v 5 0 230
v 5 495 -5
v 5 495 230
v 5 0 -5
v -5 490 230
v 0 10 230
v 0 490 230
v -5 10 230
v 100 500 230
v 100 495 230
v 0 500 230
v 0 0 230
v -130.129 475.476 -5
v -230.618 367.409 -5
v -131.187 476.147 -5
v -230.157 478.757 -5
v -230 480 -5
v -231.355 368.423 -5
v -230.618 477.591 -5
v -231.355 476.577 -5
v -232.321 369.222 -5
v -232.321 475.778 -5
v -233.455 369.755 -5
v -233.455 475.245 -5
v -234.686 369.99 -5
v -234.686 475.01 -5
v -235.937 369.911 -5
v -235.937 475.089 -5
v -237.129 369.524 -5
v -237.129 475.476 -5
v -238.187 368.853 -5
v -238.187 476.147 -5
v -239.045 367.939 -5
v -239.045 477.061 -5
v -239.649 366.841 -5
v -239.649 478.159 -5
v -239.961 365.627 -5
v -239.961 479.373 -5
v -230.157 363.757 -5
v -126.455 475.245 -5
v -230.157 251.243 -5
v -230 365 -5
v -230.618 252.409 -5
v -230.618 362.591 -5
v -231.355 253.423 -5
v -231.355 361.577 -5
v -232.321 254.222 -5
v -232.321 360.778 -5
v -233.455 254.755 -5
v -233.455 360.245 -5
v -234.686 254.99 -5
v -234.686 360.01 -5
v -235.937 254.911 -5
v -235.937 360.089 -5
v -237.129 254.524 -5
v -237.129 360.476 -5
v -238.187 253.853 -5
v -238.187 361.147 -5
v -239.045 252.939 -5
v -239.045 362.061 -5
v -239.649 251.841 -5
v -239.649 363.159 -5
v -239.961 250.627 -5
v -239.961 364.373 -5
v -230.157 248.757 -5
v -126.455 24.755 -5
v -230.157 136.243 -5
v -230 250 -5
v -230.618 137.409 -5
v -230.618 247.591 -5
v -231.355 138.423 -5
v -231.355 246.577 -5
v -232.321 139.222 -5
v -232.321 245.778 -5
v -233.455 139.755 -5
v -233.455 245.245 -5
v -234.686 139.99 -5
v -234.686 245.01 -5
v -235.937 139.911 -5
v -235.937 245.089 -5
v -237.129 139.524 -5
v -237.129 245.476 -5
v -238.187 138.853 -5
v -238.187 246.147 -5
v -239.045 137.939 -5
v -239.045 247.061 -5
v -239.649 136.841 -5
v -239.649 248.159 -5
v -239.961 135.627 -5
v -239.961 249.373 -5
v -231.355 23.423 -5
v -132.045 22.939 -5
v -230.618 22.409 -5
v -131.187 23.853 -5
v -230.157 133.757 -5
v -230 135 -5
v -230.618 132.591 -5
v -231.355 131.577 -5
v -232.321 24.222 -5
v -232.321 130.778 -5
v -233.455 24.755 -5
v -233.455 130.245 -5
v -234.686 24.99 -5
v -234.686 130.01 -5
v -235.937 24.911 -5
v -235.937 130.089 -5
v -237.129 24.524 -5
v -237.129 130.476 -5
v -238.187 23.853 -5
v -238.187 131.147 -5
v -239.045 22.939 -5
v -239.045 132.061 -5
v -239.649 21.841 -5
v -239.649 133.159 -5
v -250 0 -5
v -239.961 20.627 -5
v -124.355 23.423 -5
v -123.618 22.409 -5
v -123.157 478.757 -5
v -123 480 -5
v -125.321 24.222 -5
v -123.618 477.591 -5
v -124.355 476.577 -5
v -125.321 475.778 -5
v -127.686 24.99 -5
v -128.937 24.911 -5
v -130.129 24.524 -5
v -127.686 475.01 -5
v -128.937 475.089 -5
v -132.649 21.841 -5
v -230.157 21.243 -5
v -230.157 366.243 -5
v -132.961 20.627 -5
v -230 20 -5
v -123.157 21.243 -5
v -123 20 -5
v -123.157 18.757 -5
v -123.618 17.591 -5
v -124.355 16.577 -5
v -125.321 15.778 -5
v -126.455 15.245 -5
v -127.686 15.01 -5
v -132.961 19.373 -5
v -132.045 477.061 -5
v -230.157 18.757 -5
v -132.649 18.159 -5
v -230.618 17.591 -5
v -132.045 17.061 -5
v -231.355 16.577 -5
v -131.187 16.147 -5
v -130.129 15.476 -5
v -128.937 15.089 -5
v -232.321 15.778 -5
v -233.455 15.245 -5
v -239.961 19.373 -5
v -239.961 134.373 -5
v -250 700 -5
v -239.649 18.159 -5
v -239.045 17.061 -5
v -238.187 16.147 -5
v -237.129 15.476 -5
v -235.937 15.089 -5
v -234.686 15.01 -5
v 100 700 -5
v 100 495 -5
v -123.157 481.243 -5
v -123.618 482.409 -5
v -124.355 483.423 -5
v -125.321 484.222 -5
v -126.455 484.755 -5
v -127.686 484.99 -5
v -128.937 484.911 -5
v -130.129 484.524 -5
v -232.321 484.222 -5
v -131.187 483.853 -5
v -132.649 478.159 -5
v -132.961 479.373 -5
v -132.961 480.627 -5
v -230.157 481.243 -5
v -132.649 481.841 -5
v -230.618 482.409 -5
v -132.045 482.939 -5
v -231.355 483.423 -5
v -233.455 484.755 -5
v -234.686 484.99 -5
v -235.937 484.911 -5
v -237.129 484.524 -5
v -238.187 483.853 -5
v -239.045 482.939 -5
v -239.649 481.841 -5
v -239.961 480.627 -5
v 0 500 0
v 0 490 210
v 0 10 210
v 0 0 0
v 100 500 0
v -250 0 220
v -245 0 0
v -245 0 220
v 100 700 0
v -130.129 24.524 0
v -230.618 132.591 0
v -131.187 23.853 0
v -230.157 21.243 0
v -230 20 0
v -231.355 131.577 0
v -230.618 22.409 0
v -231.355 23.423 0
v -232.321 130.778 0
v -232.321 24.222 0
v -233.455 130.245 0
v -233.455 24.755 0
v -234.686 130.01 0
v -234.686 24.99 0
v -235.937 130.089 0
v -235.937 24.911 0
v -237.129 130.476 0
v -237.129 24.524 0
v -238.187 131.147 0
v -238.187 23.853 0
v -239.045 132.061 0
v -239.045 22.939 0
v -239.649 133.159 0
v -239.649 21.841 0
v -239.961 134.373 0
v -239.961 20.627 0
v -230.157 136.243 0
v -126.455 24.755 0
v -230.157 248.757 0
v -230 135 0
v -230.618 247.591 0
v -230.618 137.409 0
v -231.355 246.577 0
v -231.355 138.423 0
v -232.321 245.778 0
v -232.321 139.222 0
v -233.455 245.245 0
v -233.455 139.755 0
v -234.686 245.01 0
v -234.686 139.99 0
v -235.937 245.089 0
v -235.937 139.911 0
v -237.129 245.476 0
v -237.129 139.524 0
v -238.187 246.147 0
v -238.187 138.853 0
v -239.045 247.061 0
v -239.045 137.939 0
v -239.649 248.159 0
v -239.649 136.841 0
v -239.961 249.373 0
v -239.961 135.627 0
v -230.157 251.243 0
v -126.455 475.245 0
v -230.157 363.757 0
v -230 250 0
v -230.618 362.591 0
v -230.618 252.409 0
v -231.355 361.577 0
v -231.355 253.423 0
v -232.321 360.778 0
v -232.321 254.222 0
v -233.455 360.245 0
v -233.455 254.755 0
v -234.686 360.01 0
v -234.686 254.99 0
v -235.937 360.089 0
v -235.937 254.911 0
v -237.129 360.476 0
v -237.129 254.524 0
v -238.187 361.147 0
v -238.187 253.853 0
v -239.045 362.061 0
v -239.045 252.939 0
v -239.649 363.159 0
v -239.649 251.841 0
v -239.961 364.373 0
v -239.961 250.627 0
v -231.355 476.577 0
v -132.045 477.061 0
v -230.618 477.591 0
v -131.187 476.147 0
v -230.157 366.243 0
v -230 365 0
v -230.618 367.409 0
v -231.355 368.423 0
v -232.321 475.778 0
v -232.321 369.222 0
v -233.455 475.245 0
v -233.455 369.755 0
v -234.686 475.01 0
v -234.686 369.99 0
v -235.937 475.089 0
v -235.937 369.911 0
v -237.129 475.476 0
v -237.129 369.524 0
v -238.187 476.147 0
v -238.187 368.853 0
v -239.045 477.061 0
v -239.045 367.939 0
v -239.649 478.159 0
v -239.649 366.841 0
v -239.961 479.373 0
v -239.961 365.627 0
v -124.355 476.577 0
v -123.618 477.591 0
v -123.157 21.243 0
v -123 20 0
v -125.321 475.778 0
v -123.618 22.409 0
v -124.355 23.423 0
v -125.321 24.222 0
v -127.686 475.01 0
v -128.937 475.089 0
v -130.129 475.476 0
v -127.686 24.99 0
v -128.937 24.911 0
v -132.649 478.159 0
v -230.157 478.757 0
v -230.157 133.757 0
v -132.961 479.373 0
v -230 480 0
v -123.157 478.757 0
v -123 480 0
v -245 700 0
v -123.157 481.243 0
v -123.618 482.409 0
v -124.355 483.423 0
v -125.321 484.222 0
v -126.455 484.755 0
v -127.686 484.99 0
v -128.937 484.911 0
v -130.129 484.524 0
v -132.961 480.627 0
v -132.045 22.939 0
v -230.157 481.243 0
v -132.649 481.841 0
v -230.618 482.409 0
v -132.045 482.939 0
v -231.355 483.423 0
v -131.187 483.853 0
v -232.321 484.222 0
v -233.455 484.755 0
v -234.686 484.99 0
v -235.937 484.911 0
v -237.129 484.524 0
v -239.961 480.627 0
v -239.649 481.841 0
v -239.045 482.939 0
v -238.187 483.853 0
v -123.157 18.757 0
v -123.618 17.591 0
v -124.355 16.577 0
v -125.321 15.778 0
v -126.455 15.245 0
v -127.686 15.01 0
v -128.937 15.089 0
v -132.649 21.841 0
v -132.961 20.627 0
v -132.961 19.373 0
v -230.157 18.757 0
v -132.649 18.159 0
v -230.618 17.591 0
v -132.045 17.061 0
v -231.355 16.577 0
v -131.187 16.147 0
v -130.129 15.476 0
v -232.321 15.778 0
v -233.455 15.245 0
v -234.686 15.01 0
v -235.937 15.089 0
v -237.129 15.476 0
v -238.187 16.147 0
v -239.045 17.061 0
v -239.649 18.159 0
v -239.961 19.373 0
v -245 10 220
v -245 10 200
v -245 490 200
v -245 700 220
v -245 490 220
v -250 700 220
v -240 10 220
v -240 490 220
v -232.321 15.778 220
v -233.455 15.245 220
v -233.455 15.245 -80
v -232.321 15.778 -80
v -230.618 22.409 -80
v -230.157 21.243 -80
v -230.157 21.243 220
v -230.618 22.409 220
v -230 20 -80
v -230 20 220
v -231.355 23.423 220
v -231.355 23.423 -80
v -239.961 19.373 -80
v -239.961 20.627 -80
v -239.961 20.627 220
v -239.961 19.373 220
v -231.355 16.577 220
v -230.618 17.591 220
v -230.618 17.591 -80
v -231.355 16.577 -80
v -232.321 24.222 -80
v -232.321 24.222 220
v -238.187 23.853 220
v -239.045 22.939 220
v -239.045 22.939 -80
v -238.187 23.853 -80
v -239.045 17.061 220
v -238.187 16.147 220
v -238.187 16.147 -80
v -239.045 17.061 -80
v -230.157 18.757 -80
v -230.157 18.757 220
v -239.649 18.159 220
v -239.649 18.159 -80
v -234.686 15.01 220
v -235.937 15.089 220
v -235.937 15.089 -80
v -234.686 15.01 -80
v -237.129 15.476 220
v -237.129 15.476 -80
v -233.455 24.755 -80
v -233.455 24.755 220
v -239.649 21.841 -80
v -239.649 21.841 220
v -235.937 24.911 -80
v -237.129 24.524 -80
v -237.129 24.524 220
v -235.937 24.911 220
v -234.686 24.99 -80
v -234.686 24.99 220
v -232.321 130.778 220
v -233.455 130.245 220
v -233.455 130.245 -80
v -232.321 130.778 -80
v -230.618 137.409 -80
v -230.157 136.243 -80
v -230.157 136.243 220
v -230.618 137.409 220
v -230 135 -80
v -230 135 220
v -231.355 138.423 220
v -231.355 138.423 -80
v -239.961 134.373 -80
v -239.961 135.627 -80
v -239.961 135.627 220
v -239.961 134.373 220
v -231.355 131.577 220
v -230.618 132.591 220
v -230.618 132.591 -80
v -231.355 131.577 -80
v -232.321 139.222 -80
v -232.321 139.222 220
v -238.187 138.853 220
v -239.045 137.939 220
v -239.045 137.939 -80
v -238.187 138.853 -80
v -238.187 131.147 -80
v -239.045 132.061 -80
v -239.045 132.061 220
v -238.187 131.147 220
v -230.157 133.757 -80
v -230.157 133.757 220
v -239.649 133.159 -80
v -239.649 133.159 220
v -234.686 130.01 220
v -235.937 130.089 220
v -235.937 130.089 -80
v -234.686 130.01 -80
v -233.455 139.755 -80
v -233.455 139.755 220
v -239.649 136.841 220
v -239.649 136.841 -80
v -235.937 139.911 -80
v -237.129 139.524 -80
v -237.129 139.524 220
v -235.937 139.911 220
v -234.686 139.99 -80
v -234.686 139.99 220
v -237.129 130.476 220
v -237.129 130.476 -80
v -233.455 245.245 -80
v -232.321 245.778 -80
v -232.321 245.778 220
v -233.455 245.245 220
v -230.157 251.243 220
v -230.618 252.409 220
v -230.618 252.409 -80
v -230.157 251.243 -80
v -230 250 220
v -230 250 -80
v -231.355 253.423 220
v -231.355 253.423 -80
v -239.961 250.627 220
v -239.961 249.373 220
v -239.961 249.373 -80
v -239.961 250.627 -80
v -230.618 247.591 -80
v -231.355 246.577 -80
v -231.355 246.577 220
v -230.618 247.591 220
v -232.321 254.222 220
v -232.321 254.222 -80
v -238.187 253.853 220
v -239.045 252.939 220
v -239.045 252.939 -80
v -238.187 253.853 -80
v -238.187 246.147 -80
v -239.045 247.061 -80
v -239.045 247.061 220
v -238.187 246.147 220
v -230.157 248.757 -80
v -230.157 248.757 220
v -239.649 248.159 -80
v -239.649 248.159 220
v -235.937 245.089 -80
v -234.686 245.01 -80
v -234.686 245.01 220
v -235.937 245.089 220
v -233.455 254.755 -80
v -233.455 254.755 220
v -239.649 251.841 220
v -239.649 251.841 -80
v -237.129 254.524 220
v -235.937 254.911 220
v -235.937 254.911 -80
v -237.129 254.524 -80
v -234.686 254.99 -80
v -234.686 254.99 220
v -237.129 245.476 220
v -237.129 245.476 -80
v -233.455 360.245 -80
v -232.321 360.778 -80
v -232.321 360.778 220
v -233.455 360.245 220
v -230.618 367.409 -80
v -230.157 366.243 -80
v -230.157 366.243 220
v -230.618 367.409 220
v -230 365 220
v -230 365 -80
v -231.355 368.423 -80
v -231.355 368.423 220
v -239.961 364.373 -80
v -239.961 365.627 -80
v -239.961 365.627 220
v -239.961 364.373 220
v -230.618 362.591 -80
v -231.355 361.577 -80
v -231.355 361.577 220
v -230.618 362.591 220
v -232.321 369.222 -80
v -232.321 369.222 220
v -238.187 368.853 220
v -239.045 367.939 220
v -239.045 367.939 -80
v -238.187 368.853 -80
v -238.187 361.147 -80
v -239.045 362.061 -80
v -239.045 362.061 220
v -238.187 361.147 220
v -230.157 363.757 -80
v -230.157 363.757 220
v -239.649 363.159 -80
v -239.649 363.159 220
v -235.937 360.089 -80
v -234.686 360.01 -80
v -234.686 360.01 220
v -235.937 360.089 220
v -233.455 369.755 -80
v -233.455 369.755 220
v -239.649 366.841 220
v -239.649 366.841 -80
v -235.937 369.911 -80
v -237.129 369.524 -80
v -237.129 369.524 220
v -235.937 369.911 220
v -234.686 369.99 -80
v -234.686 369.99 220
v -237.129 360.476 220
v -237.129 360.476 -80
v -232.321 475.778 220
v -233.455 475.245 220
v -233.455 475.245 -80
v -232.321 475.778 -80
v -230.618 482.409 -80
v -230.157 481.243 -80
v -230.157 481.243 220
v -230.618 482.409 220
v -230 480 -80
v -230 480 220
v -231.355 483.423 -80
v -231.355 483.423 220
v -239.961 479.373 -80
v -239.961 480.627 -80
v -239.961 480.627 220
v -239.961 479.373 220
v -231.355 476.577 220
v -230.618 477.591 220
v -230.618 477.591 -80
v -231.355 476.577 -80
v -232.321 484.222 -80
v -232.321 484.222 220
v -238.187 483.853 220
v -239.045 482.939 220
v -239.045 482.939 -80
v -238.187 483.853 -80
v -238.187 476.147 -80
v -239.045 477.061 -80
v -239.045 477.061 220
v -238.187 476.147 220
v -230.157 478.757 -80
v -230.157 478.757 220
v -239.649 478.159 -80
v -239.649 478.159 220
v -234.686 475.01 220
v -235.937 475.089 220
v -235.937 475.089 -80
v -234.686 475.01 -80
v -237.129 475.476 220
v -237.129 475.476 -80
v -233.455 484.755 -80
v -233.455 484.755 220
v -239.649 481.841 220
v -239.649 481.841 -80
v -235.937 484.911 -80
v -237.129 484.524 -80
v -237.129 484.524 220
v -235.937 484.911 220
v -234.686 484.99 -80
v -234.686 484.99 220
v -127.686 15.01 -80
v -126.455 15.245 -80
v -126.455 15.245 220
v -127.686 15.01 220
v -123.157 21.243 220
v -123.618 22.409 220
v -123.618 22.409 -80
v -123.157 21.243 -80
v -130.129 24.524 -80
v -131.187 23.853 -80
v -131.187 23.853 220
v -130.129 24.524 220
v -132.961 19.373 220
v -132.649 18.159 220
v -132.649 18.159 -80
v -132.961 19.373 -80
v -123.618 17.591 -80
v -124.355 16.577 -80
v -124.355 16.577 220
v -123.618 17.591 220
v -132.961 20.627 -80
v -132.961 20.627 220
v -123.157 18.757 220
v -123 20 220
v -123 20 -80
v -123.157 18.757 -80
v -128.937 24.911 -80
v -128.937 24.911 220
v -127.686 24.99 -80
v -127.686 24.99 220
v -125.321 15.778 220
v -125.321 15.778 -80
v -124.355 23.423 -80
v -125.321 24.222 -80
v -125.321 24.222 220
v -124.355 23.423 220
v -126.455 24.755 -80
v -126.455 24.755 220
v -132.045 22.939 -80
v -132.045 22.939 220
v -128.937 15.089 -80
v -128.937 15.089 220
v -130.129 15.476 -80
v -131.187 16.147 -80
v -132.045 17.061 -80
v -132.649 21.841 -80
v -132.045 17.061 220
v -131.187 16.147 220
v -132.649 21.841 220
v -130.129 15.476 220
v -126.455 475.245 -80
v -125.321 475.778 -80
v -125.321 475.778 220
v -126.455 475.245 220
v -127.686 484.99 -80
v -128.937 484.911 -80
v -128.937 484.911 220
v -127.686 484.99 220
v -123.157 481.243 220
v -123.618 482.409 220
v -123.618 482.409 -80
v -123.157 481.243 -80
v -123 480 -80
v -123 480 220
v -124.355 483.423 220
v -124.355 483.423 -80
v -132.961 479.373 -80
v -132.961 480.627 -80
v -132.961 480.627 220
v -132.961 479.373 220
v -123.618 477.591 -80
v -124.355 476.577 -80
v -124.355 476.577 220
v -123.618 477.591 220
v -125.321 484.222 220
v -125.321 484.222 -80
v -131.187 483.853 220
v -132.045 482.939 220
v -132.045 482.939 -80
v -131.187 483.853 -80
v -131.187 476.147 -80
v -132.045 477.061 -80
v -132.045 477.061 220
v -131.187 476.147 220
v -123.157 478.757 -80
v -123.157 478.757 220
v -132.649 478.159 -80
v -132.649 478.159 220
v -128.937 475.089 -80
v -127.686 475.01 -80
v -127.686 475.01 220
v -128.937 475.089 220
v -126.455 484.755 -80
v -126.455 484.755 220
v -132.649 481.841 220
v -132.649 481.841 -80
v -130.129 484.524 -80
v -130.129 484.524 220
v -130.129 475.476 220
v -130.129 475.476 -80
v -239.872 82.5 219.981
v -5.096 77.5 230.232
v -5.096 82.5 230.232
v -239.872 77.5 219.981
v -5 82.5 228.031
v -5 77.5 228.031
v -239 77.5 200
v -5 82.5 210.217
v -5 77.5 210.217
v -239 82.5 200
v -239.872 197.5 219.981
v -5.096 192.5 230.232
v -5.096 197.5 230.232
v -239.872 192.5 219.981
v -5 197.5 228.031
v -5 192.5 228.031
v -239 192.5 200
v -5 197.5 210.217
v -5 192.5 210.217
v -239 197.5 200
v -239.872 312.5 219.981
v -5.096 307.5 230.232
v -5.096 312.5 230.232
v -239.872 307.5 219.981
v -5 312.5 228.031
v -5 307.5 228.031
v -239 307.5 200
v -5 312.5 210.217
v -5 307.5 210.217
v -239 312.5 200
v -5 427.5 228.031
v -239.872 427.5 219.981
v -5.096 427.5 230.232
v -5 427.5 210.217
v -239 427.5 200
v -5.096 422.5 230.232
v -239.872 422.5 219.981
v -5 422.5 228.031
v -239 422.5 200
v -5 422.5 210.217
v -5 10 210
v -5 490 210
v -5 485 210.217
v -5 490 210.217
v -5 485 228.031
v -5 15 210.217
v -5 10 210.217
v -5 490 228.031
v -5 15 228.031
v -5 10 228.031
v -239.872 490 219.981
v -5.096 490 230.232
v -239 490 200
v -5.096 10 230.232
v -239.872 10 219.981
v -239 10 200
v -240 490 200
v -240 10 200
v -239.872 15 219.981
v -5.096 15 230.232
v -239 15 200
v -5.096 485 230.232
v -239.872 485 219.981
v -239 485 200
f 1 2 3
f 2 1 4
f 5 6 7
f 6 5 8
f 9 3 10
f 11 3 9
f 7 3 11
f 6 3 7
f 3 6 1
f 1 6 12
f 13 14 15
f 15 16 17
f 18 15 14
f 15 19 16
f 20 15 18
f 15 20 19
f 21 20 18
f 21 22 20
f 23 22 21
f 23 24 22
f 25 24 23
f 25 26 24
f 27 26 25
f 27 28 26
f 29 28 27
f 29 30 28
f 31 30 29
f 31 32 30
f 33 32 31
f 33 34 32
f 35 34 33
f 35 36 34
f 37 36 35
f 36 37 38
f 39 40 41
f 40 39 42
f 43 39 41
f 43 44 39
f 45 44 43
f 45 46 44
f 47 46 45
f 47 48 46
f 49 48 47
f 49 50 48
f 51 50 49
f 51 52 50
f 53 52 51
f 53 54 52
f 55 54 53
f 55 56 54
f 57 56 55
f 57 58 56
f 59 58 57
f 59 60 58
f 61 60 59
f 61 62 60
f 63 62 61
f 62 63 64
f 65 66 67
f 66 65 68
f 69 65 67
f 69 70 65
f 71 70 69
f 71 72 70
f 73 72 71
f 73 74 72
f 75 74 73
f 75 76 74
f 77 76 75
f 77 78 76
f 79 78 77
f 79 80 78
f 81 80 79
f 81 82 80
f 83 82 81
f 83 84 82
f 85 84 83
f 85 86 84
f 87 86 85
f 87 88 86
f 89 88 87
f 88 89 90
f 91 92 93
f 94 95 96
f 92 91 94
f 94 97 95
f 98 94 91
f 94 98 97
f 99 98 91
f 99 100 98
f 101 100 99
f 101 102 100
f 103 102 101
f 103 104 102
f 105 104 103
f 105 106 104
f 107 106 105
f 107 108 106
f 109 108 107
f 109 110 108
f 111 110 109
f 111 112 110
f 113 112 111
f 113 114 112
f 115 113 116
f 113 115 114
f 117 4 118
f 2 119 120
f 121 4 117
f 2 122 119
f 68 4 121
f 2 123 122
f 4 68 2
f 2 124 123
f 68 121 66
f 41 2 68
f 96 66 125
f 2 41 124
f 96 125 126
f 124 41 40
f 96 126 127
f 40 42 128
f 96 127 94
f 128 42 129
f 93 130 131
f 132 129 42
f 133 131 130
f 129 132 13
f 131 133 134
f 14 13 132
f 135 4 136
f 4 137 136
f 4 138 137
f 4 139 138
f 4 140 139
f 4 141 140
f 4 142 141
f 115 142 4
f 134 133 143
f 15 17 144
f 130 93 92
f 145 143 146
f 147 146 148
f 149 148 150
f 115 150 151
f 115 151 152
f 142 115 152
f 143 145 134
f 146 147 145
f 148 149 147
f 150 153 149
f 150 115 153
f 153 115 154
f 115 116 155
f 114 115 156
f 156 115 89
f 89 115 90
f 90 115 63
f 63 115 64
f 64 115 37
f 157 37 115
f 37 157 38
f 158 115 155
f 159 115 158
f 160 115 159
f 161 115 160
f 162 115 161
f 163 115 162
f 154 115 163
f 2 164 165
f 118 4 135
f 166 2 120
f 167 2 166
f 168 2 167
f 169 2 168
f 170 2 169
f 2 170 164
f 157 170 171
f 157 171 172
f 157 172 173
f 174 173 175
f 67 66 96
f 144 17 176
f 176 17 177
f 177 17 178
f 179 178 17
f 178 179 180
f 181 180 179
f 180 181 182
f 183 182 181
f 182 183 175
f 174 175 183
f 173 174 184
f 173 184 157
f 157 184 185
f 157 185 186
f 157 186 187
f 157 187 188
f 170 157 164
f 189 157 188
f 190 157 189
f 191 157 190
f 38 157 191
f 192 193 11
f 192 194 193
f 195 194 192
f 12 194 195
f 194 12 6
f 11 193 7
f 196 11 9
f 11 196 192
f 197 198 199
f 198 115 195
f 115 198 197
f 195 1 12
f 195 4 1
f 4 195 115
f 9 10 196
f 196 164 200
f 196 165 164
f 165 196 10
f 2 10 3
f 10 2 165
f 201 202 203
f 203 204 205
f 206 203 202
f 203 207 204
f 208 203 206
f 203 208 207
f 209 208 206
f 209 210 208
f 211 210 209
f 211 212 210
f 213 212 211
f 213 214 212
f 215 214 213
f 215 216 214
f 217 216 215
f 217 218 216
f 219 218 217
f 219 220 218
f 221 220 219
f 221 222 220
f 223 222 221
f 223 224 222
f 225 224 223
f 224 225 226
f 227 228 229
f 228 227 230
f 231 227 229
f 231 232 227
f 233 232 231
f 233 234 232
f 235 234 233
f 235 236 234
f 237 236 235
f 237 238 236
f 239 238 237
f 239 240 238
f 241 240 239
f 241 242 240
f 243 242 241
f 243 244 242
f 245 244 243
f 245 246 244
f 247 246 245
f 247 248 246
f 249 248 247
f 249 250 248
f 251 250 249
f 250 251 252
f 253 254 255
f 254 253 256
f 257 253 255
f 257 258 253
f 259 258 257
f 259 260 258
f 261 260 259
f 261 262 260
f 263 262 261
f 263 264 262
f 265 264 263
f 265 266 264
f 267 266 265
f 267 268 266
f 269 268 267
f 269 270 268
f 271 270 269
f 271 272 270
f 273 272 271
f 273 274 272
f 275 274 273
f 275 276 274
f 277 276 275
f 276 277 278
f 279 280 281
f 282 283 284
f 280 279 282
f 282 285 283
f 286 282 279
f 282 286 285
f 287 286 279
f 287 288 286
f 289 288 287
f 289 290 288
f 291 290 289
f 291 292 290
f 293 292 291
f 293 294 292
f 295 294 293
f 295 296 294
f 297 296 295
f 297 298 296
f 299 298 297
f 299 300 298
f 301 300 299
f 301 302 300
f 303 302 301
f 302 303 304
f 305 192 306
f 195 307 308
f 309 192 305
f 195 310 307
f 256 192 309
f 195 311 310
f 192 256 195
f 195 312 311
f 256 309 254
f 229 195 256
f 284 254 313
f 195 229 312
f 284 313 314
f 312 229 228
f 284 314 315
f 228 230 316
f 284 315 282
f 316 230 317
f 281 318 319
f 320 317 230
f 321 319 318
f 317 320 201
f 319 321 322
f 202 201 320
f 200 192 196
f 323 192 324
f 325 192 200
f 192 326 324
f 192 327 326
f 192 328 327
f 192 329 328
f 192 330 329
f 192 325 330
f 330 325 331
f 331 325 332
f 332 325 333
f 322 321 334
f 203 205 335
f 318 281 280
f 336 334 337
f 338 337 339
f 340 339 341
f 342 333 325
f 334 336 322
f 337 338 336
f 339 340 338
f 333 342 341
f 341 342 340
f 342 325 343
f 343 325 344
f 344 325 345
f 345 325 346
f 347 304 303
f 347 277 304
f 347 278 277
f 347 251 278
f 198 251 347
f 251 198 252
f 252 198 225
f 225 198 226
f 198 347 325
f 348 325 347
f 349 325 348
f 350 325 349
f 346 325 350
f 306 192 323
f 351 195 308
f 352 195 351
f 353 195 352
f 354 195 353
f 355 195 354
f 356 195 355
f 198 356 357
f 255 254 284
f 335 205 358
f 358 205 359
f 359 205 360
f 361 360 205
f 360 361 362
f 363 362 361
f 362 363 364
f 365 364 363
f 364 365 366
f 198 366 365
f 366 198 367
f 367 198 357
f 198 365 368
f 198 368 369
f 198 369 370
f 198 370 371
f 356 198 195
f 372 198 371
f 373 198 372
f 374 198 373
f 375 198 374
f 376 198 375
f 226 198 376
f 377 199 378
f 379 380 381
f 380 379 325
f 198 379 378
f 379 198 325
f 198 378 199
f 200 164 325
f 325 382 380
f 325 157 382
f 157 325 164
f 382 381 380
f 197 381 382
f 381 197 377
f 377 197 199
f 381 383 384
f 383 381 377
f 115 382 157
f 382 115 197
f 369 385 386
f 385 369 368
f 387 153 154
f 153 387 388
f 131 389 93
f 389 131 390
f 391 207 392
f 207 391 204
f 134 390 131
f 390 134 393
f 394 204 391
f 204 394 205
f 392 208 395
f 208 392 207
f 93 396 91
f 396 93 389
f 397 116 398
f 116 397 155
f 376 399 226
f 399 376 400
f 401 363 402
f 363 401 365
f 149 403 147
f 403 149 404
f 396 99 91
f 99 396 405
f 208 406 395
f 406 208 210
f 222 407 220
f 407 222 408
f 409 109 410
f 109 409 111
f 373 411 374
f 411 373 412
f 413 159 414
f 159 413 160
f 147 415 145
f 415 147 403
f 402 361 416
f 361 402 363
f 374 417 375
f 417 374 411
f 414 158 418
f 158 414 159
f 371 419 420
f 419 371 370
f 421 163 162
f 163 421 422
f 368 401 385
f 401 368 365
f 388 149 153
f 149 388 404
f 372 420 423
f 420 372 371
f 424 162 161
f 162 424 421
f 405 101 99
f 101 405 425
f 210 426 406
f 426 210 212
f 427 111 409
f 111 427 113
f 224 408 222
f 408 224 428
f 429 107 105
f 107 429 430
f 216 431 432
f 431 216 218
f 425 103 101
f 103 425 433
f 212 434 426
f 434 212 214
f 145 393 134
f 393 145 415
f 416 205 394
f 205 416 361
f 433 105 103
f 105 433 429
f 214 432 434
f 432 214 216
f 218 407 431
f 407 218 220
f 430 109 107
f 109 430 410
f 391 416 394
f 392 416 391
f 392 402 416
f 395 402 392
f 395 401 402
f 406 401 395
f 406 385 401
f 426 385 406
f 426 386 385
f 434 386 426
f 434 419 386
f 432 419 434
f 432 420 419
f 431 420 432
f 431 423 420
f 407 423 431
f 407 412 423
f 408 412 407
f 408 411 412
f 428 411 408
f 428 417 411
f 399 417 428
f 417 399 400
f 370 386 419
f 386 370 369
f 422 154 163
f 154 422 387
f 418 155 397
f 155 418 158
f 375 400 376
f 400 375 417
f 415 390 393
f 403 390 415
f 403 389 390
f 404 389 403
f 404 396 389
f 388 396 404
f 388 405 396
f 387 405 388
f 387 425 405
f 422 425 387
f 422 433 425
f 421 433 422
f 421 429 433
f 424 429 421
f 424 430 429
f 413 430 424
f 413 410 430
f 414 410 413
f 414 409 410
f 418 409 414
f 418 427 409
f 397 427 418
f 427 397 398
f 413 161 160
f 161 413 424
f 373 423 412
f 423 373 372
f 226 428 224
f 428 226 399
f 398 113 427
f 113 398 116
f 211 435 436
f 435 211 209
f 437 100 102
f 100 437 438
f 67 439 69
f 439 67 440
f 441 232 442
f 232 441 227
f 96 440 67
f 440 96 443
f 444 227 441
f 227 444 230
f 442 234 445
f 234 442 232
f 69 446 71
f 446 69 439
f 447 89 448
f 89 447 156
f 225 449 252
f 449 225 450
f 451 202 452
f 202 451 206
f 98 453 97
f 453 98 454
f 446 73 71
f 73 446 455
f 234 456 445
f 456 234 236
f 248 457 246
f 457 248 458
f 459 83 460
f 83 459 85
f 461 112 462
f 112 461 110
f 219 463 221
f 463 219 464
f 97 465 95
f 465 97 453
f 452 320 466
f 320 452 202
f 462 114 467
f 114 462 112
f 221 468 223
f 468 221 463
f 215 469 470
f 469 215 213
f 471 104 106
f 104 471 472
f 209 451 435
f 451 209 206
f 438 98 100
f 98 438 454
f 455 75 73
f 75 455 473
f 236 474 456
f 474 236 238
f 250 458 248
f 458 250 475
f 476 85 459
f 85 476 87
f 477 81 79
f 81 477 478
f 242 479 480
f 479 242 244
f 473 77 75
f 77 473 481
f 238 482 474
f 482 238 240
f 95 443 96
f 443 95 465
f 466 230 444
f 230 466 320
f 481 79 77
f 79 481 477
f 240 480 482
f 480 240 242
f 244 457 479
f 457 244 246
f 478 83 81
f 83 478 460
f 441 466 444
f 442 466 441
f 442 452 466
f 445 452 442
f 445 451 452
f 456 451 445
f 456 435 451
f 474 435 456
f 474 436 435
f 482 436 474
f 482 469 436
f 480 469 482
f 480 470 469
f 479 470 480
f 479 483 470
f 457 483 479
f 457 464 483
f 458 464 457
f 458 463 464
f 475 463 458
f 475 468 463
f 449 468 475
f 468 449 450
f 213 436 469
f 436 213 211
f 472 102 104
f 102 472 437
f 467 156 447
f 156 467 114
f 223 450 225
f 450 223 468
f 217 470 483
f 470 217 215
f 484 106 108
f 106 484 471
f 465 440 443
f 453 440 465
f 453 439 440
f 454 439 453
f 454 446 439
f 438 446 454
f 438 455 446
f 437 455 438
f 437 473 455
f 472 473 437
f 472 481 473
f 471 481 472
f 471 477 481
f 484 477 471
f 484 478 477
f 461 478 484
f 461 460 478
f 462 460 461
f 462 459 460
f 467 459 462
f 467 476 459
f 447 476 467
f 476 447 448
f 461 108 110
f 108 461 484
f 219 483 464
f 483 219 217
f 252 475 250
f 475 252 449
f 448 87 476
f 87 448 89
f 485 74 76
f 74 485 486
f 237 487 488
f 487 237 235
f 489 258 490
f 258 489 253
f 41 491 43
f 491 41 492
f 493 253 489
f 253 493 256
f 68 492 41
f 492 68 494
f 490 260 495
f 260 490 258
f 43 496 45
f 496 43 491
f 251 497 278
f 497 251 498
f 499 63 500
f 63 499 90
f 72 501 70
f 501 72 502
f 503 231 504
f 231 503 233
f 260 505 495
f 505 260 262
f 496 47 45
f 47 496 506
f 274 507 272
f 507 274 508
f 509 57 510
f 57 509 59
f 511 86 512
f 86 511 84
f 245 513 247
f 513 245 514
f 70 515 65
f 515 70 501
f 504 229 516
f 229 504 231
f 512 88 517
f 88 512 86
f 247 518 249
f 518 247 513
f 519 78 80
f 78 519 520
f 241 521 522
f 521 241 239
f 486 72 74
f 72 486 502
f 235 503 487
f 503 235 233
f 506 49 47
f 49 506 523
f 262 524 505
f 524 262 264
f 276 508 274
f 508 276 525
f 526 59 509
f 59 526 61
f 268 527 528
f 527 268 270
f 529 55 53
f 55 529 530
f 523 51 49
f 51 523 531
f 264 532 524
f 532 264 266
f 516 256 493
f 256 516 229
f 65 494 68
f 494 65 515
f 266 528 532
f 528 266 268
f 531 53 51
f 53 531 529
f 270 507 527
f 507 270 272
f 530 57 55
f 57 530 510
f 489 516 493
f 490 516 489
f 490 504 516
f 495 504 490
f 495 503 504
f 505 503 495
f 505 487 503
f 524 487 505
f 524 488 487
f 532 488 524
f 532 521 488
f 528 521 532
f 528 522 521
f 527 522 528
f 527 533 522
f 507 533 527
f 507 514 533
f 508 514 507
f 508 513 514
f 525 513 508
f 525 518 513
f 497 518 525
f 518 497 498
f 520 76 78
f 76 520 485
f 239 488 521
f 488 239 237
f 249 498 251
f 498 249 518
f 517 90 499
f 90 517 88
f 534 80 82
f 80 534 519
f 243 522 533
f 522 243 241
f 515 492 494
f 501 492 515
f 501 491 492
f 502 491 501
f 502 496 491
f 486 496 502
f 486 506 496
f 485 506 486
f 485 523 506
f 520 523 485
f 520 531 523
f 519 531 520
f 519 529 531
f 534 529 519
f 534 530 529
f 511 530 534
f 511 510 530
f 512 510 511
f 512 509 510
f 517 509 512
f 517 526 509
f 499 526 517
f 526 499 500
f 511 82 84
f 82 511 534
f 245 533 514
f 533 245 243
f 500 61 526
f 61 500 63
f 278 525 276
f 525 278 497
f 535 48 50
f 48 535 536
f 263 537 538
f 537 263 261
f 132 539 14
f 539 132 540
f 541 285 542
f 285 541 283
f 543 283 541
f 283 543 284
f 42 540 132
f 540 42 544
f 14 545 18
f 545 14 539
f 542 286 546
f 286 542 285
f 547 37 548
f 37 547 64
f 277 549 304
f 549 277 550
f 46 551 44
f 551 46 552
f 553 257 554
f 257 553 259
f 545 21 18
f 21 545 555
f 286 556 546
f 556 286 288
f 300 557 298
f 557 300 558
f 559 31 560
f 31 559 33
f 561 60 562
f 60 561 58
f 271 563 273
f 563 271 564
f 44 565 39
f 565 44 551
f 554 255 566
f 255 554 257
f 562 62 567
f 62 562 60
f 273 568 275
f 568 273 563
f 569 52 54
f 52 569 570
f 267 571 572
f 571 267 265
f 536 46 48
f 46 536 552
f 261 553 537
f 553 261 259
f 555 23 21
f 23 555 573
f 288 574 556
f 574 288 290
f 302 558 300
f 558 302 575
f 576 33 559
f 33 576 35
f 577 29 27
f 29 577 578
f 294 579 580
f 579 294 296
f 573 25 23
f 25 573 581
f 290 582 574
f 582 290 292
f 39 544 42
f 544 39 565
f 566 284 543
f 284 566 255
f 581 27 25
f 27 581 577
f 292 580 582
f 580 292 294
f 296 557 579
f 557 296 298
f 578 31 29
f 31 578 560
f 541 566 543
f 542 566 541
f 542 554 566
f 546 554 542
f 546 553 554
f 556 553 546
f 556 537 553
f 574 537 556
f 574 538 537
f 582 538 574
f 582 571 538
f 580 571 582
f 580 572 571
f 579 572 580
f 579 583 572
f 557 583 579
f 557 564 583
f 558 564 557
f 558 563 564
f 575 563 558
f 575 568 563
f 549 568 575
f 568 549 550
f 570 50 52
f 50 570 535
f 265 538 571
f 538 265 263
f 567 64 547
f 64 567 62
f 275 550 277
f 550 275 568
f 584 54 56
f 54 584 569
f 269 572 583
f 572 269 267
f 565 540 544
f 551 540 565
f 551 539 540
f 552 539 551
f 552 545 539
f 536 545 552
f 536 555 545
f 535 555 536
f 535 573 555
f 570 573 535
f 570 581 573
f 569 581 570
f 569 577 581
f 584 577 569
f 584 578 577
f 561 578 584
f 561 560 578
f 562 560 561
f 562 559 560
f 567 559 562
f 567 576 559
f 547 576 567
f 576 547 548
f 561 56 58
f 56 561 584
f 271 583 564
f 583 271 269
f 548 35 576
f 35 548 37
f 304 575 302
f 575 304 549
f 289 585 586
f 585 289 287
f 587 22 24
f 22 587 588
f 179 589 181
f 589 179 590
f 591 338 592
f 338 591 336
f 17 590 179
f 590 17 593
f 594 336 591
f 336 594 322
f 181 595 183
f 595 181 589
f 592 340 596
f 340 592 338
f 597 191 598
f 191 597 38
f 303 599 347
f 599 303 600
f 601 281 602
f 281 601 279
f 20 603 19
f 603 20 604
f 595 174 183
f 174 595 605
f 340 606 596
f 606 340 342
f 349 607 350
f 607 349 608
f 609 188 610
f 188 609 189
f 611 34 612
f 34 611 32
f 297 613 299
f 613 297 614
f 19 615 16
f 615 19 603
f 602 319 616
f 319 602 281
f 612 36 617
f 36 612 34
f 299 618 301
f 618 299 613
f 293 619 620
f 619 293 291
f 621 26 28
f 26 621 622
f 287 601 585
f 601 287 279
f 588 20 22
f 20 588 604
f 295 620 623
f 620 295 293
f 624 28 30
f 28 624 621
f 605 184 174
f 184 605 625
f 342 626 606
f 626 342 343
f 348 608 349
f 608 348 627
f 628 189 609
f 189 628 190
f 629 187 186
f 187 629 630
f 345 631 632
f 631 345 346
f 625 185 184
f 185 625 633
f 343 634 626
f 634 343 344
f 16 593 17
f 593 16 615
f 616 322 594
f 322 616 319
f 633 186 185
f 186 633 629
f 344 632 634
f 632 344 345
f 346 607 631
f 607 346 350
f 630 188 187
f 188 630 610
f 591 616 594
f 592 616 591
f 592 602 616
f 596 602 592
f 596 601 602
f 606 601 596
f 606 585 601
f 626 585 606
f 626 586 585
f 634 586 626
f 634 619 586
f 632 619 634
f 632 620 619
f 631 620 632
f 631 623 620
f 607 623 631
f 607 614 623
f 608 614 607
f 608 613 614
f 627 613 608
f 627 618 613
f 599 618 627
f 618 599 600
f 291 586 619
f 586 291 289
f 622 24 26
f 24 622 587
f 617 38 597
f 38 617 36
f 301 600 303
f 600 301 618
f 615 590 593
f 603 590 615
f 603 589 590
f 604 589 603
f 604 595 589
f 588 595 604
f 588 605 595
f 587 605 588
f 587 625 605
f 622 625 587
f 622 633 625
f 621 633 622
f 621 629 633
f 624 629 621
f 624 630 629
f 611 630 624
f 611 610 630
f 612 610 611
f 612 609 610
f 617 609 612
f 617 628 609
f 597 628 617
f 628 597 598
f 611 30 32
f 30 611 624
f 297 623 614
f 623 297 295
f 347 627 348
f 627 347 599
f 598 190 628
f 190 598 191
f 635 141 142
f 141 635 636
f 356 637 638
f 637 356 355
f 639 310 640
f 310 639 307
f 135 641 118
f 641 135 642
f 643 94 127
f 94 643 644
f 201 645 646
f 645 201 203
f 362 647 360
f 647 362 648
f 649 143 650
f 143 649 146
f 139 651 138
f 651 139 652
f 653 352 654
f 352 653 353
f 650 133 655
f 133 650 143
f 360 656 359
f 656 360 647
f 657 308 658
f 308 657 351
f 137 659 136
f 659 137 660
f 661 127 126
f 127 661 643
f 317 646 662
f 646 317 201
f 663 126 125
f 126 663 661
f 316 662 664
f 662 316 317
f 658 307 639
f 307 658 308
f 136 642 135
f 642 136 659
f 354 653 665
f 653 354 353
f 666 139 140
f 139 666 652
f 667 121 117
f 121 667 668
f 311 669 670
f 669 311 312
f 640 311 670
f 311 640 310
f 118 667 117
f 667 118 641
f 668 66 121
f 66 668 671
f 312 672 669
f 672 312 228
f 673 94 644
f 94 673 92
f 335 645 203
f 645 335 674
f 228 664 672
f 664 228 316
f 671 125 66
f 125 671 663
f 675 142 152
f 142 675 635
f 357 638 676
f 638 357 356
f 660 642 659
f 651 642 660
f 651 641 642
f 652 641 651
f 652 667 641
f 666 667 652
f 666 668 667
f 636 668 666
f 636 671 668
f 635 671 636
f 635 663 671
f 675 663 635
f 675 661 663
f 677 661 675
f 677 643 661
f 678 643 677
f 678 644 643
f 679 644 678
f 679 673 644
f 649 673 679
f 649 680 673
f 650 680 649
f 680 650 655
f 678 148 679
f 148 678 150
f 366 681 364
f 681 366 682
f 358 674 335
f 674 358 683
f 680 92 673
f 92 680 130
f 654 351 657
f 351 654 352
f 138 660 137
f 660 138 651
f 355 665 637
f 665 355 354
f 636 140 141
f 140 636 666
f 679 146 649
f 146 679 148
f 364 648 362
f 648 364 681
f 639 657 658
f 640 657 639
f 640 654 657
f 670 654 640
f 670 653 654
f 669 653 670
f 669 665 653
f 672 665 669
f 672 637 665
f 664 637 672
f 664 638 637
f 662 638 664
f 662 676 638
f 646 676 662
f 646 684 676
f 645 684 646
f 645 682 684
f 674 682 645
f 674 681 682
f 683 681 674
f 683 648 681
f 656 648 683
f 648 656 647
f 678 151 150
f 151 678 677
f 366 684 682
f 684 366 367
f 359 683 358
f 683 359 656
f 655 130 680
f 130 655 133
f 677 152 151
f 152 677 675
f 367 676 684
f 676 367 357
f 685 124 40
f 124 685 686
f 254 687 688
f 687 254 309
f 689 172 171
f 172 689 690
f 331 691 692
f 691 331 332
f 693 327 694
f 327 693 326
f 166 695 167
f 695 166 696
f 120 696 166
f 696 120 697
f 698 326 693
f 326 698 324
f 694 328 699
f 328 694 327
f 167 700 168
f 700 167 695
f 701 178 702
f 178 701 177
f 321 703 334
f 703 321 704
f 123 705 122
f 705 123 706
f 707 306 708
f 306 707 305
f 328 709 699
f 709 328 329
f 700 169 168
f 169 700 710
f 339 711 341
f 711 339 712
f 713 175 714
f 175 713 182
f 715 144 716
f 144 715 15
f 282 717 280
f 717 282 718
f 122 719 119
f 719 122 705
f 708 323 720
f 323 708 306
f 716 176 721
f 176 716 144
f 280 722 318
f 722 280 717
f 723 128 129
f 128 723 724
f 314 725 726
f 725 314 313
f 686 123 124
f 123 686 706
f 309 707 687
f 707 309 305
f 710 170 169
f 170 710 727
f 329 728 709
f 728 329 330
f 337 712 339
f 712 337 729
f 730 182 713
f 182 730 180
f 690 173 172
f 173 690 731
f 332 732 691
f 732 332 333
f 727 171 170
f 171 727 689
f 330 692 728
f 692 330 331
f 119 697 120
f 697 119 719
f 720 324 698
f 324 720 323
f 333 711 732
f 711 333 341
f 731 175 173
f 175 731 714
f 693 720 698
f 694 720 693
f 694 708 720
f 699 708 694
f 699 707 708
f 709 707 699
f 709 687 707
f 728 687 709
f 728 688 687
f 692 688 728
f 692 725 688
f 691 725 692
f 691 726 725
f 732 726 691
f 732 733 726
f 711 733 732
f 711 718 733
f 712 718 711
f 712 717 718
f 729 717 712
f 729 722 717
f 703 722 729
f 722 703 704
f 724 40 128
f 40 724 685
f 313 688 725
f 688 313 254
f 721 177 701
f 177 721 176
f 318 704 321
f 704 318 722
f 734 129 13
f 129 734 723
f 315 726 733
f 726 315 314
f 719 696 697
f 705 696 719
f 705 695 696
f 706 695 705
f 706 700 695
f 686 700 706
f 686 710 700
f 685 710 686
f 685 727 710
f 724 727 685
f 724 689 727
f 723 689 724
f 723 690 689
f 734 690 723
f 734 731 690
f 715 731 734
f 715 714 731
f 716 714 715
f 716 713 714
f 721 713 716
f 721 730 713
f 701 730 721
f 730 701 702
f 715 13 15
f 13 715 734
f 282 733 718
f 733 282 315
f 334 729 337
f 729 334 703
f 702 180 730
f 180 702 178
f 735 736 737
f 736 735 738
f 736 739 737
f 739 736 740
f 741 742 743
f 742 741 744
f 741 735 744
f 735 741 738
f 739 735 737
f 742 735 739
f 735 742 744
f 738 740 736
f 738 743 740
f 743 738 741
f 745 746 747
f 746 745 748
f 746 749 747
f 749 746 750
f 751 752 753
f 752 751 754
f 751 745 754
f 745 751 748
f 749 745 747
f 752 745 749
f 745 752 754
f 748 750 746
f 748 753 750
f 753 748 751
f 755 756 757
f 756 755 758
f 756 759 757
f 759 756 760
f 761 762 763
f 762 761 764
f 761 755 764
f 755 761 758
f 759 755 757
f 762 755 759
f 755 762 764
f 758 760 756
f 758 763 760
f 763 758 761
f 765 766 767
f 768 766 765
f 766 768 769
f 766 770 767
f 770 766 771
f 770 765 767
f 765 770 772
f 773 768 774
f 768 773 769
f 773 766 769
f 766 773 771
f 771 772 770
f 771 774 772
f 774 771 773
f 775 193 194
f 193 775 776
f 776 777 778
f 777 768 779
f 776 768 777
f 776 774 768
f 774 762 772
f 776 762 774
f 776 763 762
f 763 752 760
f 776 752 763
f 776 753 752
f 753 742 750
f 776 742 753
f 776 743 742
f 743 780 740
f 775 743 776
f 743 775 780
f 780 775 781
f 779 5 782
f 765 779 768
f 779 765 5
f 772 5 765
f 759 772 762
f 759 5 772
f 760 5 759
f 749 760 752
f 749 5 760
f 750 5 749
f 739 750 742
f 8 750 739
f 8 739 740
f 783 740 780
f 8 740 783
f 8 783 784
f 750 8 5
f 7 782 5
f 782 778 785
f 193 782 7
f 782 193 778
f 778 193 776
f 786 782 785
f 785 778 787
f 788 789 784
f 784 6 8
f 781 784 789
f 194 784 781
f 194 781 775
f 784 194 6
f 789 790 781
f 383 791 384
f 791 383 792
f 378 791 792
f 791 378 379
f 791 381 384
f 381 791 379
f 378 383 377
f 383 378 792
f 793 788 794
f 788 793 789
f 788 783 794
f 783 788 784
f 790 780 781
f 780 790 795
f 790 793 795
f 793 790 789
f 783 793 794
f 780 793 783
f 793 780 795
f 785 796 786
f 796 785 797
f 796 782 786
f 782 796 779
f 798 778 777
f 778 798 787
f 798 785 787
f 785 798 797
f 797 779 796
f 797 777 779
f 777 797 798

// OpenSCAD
wall_height = 230;
wall_length = 500;
sidewalk_width = 118;
green_width = 127;
hedge_height = 220;

poles = 5;
pole_height = 300;
start_pole = 20;

building();
sidewalk();
grass();
hedge();
poles();
load_bearers();
roof();

module building() {
  translate([0, 0, -5])
    color("GhostWhite") cube([5, wall_length, wall_height + 5]);

  translate([0, wall_length - 5, -5])
    color("GhostWhite") cube([100, 5, wall_height + 5]);
}

module sidewalk() {
  translate([-sidewalk_width, 0, -5])
    color("Grey") cube([sidewalk_width, wall_length, 5]);

  translate([-sidewalk_width, wall_length, -5])
    color("Grey") cube([sidewalk_width + 100, sidewalk_width, 5]);
}

module grass() {
  translate([-green_width - sidewalk_width, 0, -5])
    color("Green") cube([green_width, wall_length, 5]);

  translate([-green_width - sidewalk_width, wall_length, -5])
    color("Green") cube([green_width, 200, 5]);

  translate([-green_width - sidewalk_width, wall_length, -5])
    color("Green") cube([green_width, 200, 5]);

  translate([-sidewalk_width, wall_length + sidewalk_width, -5])
    color("Green") cube([sidewalk_width + 100, 82, 5]);
}

module hedge() {
  translate([-green_width - sidewalk_width - 5, 0, -5])
    color("DarkGreen") cube([5, wall_length, hedge_height + 5]);

  translate([-green_width - sidewalk_width - 5, wall_length, -5])
    color("DarkGreen") cube([5, 200, hedge_height + 5]);
}

module poles() {
  margins = start_pole * 2;
  spread_over = wall_length - margins;
  interval = spread_over / (poles - 1);

  for (i = [0:interval:spread_over]) {
    translate([-green_width - sidewalk_width + 10, start_pole + i, -1 * (hedge_height - pole_height + 10)])
      color("Brown") cylinder(h=pole_height, r=5, center=true, $fn=25);
  }

  translate([-sidewalk_width - 10, start_pole, -1 * (hedge_height - pole_height + 10)])
    color("Brown") cylinder(h=pole_height, r=5, center=true, $fn=25);

  translate([-sidewalk_width - 10, wall_length - start_pole, -1 * (hedge_height - pole_height + 10)])
    color("Brown") cylinder(h=pole_height, r=5, center=true, $fn=25);
}

module load_bearers() {
  translate([-5, 10, wall_height - 20])
    color("Brown") cube([5, wall_length - 20, 20]);

  translate([-green_width - sidewalk_width, 10, hedge_height - 20])
    color("Brown") cube([5, wall_length - 20, 20]);

  translate([-sidewalk_width - green_width + 6, 10, wall_height - 20 - 10])
  rotate([0,-2.5,0])
    color("Blue") cube([sidewalk_width + green_width - 10, 5, 20]);

  margins = start_pole * 2;
  spread_over = wall_length - margins;
  interval = spread_over / (poles - 1);

  for (i = [start_pole + interval:interval:spread_over + interval]) {
    translate([-sidewalk_width - green_width + 6, i - (interval / 2), wall_height - 20 - 10])
    rotate([0,-2.5,0])
      color("Blue") cube([sidewalk_width + green_width - 10, 5, 20]);
  }

  translate([-sidewalk_width - green_width + 6, wall_length - 15, wall_height - 20 - 10])
  rotate([0,-2.5,0])
    color("Blue") cube([sidewalk_width + green_width - 10, 5, 20]);
}

module roof() {
  translate([-sidewalk_width - green_width, 0, wall_height - 10])
  rotate([0,-2.5,0])
    color([1,1,1,0.8]) %cube([sidewalk_width + green_width, wall_length, 2]);
}
